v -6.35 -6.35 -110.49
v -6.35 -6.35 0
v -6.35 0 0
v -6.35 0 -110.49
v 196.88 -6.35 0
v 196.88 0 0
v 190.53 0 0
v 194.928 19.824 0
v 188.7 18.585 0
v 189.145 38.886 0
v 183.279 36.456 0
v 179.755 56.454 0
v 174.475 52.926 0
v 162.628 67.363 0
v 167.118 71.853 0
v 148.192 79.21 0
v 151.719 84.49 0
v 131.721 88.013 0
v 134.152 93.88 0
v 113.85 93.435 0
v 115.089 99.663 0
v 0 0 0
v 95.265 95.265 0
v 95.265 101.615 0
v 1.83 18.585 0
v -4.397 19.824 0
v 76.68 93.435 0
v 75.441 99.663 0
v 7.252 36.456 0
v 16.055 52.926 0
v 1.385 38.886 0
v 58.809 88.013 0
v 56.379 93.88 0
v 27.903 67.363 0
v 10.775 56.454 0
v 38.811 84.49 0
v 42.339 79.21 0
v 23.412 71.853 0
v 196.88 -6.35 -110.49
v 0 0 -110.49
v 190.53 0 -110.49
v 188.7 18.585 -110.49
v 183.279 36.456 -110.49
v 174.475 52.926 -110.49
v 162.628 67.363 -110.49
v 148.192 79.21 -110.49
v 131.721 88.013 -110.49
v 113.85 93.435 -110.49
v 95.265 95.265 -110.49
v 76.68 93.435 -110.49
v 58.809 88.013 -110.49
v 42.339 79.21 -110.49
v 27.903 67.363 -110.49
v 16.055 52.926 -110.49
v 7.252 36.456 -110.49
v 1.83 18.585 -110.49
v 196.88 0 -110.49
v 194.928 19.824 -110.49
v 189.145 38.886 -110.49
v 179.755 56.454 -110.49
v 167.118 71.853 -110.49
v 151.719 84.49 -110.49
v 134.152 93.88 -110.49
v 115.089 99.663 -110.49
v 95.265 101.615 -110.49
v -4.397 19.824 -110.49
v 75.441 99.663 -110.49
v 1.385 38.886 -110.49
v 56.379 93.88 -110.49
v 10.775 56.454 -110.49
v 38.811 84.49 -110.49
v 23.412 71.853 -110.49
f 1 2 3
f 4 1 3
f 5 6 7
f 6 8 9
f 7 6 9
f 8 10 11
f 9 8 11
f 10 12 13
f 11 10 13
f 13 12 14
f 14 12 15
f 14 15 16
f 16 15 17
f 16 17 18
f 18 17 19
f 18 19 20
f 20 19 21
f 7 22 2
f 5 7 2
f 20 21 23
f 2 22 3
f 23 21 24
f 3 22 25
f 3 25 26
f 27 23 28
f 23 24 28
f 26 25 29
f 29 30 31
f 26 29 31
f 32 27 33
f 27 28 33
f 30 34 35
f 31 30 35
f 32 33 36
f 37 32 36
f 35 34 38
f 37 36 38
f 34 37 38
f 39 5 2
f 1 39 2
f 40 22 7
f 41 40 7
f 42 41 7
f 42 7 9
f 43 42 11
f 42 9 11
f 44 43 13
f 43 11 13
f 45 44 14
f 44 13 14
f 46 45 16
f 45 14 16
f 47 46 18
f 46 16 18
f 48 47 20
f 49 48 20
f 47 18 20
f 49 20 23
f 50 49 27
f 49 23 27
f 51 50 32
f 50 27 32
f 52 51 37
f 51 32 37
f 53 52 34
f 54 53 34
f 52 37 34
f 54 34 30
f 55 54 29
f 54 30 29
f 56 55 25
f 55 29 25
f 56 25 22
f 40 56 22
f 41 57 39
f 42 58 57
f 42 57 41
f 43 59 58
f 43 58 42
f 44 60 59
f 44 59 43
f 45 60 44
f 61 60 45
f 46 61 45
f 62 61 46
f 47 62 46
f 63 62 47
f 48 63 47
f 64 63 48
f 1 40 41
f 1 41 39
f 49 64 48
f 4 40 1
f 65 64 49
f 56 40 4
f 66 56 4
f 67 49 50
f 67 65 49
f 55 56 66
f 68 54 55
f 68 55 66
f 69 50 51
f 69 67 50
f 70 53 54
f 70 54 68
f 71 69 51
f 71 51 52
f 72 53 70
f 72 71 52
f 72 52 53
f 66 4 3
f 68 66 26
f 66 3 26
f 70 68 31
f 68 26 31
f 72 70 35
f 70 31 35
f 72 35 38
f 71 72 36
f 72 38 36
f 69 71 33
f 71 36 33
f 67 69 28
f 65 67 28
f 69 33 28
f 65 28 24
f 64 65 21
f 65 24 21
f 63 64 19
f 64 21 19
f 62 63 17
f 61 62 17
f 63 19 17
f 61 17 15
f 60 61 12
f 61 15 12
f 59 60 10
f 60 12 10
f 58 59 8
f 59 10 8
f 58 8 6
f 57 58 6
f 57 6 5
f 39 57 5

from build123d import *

# Parameters (mm, degrees)
EXTRUDE2_DEPTH = 110.49


with BuildPart() as part:
    # Sketch9 → Extrude2 (new body)
    with BuildSketch(Plane.XY):
        with BuildLine():
            ThreePointArc((-6.35, 0), (95.265102475, 101.615102475), (196.880204949, 0))
            Line((196.880204949, 0), (196.880204949, -6.35))
            Line((196.880204949, -6.35), (190.530204949, -6.35))
            Line((190.530204949, -6.35), (-6.35, -6.35))
            Line((-6.35, -6.35), (-6.35, 0))
        make_face()
        with BuildLine():
            Line((0, 0), (190.530204949, 0))
            ThreePointArc((190.530204949, 0), (95.265102475, 95.265102475), (0, 0))
        make_face(mode=Mode.SUBTRACT)
    extrude(amount=-EXTRUDE2_DEPTH)


solid = part.part
